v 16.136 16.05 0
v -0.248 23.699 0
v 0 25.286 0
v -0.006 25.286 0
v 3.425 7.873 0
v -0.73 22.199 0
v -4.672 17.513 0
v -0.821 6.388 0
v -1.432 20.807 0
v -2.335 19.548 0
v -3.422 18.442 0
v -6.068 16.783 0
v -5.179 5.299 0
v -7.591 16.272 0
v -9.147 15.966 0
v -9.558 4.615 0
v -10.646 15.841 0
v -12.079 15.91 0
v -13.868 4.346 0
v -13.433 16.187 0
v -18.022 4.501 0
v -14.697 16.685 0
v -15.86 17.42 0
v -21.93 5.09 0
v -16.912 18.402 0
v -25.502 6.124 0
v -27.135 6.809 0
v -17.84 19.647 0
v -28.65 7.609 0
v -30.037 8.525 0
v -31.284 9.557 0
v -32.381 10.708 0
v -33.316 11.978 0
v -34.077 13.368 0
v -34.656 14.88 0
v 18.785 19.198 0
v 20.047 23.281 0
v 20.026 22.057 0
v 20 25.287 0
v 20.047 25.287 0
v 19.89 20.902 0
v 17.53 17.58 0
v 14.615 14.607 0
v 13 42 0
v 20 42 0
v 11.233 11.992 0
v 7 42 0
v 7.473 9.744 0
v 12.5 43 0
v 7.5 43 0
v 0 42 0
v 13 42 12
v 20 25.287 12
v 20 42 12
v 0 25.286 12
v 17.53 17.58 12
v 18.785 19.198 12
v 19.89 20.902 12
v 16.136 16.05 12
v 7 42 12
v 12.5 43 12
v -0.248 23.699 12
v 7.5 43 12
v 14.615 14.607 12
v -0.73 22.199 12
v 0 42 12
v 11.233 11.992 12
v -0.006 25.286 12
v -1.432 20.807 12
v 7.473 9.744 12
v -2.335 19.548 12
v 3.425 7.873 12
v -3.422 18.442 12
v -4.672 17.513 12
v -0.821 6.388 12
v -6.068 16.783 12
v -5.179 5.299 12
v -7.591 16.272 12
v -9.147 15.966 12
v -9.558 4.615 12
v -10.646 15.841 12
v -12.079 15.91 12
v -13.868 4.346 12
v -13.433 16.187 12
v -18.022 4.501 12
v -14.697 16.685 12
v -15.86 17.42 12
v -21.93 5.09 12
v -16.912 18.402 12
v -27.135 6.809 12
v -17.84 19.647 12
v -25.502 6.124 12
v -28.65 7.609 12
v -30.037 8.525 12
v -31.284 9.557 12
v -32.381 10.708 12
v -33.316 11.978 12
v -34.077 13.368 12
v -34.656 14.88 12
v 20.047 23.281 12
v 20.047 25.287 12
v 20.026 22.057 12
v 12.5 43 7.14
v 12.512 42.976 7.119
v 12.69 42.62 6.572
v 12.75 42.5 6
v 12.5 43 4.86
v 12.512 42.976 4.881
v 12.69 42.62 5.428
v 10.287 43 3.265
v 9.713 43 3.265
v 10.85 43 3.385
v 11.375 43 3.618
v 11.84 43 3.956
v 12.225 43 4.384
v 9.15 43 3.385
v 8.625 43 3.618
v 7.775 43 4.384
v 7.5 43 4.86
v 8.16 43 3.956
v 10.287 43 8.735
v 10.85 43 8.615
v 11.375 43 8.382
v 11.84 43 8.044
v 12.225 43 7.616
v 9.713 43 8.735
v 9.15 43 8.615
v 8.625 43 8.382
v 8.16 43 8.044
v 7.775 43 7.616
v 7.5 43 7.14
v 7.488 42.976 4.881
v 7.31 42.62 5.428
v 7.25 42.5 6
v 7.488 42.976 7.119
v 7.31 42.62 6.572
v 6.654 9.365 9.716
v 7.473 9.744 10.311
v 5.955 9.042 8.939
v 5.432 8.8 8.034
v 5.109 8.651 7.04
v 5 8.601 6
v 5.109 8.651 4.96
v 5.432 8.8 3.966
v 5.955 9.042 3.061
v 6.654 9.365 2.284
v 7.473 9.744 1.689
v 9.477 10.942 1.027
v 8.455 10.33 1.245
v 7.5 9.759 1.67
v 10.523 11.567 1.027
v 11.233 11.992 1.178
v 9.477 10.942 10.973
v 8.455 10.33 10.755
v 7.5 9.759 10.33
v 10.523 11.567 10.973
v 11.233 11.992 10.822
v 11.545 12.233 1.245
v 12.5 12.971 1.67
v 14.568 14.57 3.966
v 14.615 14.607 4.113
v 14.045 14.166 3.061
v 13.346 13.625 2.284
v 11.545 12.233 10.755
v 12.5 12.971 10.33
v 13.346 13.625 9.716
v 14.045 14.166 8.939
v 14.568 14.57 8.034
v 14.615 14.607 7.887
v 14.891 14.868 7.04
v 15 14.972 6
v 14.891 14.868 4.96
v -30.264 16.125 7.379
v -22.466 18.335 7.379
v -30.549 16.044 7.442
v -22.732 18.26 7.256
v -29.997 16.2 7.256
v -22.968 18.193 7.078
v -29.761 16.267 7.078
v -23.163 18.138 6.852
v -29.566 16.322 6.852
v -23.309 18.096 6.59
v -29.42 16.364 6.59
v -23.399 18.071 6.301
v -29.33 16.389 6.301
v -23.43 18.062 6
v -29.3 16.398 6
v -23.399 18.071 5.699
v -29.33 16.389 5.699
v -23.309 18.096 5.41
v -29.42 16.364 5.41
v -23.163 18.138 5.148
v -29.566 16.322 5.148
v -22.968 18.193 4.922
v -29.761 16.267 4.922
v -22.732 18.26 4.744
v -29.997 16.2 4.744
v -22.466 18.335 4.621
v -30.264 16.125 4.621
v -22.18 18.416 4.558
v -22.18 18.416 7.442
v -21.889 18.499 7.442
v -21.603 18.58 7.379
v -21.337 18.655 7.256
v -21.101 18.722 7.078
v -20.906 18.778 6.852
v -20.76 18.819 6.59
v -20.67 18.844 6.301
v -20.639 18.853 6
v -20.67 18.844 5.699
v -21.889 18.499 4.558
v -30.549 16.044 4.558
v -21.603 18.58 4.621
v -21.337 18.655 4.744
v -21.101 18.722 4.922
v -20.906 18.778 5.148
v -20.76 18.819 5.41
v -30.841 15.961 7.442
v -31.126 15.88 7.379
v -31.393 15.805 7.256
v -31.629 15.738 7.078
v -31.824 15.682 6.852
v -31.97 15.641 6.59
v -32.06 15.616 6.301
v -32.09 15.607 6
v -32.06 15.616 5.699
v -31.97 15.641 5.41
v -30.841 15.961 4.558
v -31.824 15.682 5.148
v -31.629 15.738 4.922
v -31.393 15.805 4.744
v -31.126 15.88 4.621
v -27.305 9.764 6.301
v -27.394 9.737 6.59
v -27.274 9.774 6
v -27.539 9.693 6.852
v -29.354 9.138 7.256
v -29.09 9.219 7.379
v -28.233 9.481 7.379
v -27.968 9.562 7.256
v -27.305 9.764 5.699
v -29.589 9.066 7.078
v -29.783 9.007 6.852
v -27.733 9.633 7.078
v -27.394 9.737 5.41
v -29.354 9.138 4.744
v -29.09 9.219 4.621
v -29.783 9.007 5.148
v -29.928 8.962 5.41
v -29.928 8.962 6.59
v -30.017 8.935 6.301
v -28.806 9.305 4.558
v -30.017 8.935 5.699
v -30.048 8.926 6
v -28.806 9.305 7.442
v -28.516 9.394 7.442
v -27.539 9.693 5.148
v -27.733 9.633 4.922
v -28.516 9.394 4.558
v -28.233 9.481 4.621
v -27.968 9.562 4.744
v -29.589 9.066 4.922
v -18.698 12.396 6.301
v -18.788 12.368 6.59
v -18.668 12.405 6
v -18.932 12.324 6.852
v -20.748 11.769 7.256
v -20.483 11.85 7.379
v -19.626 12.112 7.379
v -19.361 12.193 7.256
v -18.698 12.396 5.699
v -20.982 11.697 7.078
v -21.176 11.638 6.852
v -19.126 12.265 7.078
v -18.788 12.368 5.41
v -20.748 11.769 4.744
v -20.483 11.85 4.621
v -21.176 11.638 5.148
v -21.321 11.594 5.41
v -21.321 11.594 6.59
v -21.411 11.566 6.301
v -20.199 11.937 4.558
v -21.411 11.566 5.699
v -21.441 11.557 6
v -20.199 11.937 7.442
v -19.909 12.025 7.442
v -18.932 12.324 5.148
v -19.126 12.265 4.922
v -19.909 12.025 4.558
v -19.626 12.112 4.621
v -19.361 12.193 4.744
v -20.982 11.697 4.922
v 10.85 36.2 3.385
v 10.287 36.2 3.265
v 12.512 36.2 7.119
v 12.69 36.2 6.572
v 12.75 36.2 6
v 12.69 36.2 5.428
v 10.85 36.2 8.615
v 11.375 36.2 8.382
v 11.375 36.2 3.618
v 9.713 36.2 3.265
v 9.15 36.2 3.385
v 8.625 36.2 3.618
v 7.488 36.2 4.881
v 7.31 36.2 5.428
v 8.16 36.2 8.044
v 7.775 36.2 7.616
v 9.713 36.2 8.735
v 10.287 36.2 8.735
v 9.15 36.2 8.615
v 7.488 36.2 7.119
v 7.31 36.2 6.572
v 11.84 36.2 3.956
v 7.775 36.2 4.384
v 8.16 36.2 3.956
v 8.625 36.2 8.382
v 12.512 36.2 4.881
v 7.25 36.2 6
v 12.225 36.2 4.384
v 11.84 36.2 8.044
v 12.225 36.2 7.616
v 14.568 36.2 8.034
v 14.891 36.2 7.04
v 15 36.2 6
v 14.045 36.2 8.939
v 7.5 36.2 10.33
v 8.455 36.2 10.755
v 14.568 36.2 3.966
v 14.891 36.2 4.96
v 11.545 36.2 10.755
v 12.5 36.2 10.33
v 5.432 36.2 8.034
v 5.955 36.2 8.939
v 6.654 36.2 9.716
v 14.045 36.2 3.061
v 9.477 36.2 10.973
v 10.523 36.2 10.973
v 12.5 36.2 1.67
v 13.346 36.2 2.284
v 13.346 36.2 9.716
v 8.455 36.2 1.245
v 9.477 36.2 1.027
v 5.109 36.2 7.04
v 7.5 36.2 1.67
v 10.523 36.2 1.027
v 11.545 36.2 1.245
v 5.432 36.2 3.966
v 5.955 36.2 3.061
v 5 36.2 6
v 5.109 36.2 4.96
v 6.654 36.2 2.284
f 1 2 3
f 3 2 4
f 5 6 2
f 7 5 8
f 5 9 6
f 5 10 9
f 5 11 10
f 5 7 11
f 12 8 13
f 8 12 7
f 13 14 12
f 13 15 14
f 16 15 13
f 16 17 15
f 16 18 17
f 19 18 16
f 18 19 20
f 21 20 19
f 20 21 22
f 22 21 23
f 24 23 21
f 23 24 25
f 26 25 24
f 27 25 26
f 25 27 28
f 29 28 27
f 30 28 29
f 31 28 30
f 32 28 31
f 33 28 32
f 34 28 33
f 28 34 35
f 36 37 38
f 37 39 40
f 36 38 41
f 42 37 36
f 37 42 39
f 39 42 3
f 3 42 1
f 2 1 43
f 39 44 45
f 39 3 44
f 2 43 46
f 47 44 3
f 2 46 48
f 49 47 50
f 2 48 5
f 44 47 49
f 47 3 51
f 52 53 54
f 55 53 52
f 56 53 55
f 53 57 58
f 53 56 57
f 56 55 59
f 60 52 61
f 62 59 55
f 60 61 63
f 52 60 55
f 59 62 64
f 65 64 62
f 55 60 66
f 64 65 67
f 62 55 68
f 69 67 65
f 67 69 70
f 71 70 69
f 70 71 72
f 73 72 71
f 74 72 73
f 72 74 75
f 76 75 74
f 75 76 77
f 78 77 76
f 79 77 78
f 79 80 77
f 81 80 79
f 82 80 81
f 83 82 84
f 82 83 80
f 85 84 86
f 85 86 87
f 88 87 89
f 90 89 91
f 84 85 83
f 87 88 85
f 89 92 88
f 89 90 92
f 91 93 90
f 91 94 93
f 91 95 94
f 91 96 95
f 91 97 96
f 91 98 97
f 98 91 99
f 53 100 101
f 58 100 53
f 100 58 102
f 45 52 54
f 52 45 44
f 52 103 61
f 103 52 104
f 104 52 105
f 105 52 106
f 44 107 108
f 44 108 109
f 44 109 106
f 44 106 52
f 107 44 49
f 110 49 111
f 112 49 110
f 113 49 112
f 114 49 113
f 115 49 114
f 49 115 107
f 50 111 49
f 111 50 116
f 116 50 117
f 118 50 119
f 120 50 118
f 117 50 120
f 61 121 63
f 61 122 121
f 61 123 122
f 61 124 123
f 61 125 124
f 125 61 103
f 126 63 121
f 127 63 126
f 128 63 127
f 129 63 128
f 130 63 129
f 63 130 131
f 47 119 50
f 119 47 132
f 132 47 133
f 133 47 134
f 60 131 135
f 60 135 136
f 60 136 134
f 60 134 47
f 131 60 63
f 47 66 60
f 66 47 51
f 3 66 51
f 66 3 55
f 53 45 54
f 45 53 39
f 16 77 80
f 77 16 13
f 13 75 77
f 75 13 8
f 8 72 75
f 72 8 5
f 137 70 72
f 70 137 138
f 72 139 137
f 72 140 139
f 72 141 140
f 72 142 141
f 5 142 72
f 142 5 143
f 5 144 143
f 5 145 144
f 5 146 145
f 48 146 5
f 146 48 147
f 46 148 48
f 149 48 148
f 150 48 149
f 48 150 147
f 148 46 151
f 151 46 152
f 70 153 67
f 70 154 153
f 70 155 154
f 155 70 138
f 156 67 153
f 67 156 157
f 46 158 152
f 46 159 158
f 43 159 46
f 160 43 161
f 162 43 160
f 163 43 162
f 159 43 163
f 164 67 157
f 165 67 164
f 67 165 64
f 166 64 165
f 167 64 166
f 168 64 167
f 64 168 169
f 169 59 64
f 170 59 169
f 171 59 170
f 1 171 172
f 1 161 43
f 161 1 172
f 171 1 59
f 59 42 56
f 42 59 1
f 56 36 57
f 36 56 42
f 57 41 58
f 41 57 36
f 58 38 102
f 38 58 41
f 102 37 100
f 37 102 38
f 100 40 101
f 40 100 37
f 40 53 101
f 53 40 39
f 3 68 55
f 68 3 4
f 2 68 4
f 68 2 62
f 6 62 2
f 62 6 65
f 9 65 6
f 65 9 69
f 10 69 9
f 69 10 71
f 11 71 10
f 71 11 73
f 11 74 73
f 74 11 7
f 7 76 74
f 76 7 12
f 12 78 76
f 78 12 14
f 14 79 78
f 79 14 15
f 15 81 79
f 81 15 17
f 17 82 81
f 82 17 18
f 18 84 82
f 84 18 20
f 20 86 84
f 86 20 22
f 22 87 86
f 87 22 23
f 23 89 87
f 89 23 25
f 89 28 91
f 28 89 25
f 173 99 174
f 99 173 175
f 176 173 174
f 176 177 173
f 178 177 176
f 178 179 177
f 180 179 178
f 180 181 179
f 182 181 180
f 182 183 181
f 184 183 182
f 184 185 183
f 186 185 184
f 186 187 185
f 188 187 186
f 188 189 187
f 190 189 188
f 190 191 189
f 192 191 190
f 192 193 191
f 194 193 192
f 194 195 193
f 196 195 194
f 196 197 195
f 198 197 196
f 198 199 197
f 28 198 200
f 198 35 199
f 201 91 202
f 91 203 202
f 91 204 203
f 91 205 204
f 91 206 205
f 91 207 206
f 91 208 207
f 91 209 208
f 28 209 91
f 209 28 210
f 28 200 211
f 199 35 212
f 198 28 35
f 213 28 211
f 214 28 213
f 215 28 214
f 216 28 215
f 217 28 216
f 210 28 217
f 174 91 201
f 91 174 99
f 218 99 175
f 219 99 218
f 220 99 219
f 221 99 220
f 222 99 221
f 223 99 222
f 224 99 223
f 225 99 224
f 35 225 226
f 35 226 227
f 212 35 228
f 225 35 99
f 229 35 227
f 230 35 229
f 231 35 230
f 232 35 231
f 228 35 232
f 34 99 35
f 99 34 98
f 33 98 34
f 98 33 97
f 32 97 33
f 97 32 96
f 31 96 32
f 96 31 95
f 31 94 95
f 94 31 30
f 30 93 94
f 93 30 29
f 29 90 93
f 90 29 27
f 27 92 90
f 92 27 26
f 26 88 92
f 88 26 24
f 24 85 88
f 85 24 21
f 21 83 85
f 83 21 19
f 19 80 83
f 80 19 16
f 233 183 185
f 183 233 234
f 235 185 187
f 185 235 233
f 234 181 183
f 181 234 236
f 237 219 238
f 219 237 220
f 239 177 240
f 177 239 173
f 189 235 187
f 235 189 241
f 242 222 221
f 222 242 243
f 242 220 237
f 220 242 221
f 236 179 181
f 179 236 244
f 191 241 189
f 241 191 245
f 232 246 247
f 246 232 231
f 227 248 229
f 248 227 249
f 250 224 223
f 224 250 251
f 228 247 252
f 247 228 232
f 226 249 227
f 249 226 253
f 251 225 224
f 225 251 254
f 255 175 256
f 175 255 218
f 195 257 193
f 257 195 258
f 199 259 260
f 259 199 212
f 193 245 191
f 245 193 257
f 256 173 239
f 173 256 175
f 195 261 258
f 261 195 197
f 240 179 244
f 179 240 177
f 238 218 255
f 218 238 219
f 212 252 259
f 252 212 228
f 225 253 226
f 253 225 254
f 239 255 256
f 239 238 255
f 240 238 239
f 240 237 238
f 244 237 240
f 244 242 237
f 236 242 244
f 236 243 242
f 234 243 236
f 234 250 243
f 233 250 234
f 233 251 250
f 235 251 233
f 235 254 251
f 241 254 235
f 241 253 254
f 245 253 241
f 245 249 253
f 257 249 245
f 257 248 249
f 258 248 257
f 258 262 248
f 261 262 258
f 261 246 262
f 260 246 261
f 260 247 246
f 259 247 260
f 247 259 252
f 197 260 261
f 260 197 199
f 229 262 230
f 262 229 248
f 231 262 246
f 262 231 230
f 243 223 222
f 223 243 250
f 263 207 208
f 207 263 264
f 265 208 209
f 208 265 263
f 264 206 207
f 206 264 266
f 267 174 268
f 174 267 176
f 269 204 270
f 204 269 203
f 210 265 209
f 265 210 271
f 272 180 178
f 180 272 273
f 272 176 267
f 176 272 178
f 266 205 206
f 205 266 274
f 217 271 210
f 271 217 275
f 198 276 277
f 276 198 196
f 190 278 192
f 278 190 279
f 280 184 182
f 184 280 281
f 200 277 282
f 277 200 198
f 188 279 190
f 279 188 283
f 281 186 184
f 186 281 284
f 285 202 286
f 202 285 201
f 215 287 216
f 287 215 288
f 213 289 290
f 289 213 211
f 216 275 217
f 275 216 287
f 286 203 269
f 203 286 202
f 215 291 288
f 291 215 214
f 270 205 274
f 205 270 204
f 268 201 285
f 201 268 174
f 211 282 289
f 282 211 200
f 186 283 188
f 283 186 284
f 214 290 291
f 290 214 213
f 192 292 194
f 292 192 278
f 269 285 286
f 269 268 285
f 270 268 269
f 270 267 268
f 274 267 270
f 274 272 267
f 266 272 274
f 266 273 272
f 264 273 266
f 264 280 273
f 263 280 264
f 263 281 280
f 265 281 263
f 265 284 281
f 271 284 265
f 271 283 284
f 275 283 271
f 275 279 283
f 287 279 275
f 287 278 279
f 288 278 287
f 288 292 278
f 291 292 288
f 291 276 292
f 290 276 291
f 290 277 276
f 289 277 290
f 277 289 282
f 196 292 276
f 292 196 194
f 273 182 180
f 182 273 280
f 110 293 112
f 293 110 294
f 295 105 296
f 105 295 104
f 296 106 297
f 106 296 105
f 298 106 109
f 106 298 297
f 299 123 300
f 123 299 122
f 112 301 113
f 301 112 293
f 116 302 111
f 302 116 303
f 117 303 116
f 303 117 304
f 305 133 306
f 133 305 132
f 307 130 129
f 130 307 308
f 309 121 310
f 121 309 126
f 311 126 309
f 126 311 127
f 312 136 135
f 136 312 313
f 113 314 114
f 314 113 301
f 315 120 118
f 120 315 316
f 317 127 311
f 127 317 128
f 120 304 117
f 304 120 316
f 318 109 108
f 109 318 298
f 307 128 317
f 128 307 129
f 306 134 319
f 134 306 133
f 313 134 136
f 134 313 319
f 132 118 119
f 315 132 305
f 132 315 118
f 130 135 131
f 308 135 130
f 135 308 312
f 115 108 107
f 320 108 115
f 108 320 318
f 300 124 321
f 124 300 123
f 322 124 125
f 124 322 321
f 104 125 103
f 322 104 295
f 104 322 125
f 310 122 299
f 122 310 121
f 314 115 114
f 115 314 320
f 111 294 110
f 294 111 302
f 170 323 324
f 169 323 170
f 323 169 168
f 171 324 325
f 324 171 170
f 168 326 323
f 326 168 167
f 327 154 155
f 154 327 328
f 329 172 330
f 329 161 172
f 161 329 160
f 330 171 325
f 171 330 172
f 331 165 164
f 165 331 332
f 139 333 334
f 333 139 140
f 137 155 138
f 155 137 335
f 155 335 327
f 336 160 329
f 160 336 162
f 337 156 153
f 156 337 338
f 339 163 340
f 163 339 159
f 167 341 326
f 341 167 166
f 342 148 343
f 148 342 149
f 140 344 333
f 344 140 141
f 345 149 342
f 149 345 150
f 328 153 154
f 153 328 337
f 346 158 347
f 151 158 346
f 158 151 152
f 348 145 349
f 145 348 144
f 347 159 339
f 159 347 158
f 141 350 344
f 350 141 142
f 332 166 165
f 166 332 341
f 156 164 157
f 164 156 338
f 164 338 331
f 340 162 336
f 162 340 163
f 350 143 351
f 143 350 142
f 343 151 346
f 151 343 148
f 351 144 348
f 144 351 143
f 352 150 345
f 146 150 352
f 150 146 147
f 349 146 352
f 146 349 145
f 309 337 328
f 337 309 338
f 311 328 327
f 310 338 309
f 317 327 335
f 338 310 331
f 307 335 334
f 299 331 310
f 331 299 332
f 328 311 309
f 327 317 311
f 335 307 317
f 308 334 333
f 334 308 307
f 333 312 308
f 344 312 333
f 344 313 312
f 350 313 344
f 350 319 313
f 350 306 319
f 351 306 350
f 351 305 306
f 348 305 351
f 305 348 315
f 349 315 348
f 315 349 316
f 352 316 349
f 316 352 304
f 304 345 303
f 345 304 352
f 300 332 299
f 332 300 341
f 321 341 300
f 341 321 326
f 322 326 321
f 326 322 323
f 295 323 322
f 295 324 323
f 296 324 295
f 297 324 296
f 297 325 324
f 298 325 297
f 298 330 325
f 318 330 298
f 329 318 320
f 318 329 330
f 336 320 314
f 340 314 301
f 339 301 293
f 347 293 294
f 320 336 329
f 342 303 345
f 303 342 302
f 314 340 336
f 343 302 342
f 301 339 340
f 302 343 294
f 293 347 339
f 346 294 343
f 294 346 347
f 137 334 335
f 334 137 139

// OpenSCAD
$fn=30;
extrusionZOffset = 42;
slotWidth = 6;
extrusionWidth = 20;
extrusionBlankSpace = (extrusionWidth - slotWidth) / 2;

module extrusion () {
    translate([0,0,extrusionZOffset]) {
        cube([20,200,20]);
    }
}

module display () {
    translate([0,0,extrusionZOffset + 10]) {
        rotate([0,20,180]) {
            cube([100,120,10]);
        }
    }
}
/*
color("red") {
rotate([270,0,0]) {
extrusion ();
display ();
}
}*/



module base () {
linear_extrude(12) {
polygon([
    [0,extrusionZOffset],
    [extrusionBlankSpace,extrusionZOffset],
    [extrusionBlankSpace+0.5,extrusionZOffset+1],
    [extrusionWidth-extrusionBlankSpace-0.5,extrusionZOffset+1],
    [extrusionWidth-extrusionBlankSpace,extrusionZOffset],
    [extrusionWidth, extrusionZOffset],
    [extrusionWidth, extrusionZOffset-17],
    [0, extrusionZOffset-17],
    
]);
}

translate([-24,271.35+25,0]) {
linear_extrude(12) {
scale([0.94,0.94,0.94]) {    
import("DisplayArm3.dxf");
}
}
}

}

difference() {
base();

translate([-31,17,12/2  ]) {
rotate([90,0,17]) {
    
cylinder(d=2.9,h=8);
translate([9,0,0]) {
cylinder(d=2.9,h=8);
}
    
}
}

translate([10,31.2+12,6]) {
rotate([90,0,0]) {
cylinder(d=5.5,h=32);
translate([0,0,7]) {
cylinder(d=10,h=32);
}
}
}
}
